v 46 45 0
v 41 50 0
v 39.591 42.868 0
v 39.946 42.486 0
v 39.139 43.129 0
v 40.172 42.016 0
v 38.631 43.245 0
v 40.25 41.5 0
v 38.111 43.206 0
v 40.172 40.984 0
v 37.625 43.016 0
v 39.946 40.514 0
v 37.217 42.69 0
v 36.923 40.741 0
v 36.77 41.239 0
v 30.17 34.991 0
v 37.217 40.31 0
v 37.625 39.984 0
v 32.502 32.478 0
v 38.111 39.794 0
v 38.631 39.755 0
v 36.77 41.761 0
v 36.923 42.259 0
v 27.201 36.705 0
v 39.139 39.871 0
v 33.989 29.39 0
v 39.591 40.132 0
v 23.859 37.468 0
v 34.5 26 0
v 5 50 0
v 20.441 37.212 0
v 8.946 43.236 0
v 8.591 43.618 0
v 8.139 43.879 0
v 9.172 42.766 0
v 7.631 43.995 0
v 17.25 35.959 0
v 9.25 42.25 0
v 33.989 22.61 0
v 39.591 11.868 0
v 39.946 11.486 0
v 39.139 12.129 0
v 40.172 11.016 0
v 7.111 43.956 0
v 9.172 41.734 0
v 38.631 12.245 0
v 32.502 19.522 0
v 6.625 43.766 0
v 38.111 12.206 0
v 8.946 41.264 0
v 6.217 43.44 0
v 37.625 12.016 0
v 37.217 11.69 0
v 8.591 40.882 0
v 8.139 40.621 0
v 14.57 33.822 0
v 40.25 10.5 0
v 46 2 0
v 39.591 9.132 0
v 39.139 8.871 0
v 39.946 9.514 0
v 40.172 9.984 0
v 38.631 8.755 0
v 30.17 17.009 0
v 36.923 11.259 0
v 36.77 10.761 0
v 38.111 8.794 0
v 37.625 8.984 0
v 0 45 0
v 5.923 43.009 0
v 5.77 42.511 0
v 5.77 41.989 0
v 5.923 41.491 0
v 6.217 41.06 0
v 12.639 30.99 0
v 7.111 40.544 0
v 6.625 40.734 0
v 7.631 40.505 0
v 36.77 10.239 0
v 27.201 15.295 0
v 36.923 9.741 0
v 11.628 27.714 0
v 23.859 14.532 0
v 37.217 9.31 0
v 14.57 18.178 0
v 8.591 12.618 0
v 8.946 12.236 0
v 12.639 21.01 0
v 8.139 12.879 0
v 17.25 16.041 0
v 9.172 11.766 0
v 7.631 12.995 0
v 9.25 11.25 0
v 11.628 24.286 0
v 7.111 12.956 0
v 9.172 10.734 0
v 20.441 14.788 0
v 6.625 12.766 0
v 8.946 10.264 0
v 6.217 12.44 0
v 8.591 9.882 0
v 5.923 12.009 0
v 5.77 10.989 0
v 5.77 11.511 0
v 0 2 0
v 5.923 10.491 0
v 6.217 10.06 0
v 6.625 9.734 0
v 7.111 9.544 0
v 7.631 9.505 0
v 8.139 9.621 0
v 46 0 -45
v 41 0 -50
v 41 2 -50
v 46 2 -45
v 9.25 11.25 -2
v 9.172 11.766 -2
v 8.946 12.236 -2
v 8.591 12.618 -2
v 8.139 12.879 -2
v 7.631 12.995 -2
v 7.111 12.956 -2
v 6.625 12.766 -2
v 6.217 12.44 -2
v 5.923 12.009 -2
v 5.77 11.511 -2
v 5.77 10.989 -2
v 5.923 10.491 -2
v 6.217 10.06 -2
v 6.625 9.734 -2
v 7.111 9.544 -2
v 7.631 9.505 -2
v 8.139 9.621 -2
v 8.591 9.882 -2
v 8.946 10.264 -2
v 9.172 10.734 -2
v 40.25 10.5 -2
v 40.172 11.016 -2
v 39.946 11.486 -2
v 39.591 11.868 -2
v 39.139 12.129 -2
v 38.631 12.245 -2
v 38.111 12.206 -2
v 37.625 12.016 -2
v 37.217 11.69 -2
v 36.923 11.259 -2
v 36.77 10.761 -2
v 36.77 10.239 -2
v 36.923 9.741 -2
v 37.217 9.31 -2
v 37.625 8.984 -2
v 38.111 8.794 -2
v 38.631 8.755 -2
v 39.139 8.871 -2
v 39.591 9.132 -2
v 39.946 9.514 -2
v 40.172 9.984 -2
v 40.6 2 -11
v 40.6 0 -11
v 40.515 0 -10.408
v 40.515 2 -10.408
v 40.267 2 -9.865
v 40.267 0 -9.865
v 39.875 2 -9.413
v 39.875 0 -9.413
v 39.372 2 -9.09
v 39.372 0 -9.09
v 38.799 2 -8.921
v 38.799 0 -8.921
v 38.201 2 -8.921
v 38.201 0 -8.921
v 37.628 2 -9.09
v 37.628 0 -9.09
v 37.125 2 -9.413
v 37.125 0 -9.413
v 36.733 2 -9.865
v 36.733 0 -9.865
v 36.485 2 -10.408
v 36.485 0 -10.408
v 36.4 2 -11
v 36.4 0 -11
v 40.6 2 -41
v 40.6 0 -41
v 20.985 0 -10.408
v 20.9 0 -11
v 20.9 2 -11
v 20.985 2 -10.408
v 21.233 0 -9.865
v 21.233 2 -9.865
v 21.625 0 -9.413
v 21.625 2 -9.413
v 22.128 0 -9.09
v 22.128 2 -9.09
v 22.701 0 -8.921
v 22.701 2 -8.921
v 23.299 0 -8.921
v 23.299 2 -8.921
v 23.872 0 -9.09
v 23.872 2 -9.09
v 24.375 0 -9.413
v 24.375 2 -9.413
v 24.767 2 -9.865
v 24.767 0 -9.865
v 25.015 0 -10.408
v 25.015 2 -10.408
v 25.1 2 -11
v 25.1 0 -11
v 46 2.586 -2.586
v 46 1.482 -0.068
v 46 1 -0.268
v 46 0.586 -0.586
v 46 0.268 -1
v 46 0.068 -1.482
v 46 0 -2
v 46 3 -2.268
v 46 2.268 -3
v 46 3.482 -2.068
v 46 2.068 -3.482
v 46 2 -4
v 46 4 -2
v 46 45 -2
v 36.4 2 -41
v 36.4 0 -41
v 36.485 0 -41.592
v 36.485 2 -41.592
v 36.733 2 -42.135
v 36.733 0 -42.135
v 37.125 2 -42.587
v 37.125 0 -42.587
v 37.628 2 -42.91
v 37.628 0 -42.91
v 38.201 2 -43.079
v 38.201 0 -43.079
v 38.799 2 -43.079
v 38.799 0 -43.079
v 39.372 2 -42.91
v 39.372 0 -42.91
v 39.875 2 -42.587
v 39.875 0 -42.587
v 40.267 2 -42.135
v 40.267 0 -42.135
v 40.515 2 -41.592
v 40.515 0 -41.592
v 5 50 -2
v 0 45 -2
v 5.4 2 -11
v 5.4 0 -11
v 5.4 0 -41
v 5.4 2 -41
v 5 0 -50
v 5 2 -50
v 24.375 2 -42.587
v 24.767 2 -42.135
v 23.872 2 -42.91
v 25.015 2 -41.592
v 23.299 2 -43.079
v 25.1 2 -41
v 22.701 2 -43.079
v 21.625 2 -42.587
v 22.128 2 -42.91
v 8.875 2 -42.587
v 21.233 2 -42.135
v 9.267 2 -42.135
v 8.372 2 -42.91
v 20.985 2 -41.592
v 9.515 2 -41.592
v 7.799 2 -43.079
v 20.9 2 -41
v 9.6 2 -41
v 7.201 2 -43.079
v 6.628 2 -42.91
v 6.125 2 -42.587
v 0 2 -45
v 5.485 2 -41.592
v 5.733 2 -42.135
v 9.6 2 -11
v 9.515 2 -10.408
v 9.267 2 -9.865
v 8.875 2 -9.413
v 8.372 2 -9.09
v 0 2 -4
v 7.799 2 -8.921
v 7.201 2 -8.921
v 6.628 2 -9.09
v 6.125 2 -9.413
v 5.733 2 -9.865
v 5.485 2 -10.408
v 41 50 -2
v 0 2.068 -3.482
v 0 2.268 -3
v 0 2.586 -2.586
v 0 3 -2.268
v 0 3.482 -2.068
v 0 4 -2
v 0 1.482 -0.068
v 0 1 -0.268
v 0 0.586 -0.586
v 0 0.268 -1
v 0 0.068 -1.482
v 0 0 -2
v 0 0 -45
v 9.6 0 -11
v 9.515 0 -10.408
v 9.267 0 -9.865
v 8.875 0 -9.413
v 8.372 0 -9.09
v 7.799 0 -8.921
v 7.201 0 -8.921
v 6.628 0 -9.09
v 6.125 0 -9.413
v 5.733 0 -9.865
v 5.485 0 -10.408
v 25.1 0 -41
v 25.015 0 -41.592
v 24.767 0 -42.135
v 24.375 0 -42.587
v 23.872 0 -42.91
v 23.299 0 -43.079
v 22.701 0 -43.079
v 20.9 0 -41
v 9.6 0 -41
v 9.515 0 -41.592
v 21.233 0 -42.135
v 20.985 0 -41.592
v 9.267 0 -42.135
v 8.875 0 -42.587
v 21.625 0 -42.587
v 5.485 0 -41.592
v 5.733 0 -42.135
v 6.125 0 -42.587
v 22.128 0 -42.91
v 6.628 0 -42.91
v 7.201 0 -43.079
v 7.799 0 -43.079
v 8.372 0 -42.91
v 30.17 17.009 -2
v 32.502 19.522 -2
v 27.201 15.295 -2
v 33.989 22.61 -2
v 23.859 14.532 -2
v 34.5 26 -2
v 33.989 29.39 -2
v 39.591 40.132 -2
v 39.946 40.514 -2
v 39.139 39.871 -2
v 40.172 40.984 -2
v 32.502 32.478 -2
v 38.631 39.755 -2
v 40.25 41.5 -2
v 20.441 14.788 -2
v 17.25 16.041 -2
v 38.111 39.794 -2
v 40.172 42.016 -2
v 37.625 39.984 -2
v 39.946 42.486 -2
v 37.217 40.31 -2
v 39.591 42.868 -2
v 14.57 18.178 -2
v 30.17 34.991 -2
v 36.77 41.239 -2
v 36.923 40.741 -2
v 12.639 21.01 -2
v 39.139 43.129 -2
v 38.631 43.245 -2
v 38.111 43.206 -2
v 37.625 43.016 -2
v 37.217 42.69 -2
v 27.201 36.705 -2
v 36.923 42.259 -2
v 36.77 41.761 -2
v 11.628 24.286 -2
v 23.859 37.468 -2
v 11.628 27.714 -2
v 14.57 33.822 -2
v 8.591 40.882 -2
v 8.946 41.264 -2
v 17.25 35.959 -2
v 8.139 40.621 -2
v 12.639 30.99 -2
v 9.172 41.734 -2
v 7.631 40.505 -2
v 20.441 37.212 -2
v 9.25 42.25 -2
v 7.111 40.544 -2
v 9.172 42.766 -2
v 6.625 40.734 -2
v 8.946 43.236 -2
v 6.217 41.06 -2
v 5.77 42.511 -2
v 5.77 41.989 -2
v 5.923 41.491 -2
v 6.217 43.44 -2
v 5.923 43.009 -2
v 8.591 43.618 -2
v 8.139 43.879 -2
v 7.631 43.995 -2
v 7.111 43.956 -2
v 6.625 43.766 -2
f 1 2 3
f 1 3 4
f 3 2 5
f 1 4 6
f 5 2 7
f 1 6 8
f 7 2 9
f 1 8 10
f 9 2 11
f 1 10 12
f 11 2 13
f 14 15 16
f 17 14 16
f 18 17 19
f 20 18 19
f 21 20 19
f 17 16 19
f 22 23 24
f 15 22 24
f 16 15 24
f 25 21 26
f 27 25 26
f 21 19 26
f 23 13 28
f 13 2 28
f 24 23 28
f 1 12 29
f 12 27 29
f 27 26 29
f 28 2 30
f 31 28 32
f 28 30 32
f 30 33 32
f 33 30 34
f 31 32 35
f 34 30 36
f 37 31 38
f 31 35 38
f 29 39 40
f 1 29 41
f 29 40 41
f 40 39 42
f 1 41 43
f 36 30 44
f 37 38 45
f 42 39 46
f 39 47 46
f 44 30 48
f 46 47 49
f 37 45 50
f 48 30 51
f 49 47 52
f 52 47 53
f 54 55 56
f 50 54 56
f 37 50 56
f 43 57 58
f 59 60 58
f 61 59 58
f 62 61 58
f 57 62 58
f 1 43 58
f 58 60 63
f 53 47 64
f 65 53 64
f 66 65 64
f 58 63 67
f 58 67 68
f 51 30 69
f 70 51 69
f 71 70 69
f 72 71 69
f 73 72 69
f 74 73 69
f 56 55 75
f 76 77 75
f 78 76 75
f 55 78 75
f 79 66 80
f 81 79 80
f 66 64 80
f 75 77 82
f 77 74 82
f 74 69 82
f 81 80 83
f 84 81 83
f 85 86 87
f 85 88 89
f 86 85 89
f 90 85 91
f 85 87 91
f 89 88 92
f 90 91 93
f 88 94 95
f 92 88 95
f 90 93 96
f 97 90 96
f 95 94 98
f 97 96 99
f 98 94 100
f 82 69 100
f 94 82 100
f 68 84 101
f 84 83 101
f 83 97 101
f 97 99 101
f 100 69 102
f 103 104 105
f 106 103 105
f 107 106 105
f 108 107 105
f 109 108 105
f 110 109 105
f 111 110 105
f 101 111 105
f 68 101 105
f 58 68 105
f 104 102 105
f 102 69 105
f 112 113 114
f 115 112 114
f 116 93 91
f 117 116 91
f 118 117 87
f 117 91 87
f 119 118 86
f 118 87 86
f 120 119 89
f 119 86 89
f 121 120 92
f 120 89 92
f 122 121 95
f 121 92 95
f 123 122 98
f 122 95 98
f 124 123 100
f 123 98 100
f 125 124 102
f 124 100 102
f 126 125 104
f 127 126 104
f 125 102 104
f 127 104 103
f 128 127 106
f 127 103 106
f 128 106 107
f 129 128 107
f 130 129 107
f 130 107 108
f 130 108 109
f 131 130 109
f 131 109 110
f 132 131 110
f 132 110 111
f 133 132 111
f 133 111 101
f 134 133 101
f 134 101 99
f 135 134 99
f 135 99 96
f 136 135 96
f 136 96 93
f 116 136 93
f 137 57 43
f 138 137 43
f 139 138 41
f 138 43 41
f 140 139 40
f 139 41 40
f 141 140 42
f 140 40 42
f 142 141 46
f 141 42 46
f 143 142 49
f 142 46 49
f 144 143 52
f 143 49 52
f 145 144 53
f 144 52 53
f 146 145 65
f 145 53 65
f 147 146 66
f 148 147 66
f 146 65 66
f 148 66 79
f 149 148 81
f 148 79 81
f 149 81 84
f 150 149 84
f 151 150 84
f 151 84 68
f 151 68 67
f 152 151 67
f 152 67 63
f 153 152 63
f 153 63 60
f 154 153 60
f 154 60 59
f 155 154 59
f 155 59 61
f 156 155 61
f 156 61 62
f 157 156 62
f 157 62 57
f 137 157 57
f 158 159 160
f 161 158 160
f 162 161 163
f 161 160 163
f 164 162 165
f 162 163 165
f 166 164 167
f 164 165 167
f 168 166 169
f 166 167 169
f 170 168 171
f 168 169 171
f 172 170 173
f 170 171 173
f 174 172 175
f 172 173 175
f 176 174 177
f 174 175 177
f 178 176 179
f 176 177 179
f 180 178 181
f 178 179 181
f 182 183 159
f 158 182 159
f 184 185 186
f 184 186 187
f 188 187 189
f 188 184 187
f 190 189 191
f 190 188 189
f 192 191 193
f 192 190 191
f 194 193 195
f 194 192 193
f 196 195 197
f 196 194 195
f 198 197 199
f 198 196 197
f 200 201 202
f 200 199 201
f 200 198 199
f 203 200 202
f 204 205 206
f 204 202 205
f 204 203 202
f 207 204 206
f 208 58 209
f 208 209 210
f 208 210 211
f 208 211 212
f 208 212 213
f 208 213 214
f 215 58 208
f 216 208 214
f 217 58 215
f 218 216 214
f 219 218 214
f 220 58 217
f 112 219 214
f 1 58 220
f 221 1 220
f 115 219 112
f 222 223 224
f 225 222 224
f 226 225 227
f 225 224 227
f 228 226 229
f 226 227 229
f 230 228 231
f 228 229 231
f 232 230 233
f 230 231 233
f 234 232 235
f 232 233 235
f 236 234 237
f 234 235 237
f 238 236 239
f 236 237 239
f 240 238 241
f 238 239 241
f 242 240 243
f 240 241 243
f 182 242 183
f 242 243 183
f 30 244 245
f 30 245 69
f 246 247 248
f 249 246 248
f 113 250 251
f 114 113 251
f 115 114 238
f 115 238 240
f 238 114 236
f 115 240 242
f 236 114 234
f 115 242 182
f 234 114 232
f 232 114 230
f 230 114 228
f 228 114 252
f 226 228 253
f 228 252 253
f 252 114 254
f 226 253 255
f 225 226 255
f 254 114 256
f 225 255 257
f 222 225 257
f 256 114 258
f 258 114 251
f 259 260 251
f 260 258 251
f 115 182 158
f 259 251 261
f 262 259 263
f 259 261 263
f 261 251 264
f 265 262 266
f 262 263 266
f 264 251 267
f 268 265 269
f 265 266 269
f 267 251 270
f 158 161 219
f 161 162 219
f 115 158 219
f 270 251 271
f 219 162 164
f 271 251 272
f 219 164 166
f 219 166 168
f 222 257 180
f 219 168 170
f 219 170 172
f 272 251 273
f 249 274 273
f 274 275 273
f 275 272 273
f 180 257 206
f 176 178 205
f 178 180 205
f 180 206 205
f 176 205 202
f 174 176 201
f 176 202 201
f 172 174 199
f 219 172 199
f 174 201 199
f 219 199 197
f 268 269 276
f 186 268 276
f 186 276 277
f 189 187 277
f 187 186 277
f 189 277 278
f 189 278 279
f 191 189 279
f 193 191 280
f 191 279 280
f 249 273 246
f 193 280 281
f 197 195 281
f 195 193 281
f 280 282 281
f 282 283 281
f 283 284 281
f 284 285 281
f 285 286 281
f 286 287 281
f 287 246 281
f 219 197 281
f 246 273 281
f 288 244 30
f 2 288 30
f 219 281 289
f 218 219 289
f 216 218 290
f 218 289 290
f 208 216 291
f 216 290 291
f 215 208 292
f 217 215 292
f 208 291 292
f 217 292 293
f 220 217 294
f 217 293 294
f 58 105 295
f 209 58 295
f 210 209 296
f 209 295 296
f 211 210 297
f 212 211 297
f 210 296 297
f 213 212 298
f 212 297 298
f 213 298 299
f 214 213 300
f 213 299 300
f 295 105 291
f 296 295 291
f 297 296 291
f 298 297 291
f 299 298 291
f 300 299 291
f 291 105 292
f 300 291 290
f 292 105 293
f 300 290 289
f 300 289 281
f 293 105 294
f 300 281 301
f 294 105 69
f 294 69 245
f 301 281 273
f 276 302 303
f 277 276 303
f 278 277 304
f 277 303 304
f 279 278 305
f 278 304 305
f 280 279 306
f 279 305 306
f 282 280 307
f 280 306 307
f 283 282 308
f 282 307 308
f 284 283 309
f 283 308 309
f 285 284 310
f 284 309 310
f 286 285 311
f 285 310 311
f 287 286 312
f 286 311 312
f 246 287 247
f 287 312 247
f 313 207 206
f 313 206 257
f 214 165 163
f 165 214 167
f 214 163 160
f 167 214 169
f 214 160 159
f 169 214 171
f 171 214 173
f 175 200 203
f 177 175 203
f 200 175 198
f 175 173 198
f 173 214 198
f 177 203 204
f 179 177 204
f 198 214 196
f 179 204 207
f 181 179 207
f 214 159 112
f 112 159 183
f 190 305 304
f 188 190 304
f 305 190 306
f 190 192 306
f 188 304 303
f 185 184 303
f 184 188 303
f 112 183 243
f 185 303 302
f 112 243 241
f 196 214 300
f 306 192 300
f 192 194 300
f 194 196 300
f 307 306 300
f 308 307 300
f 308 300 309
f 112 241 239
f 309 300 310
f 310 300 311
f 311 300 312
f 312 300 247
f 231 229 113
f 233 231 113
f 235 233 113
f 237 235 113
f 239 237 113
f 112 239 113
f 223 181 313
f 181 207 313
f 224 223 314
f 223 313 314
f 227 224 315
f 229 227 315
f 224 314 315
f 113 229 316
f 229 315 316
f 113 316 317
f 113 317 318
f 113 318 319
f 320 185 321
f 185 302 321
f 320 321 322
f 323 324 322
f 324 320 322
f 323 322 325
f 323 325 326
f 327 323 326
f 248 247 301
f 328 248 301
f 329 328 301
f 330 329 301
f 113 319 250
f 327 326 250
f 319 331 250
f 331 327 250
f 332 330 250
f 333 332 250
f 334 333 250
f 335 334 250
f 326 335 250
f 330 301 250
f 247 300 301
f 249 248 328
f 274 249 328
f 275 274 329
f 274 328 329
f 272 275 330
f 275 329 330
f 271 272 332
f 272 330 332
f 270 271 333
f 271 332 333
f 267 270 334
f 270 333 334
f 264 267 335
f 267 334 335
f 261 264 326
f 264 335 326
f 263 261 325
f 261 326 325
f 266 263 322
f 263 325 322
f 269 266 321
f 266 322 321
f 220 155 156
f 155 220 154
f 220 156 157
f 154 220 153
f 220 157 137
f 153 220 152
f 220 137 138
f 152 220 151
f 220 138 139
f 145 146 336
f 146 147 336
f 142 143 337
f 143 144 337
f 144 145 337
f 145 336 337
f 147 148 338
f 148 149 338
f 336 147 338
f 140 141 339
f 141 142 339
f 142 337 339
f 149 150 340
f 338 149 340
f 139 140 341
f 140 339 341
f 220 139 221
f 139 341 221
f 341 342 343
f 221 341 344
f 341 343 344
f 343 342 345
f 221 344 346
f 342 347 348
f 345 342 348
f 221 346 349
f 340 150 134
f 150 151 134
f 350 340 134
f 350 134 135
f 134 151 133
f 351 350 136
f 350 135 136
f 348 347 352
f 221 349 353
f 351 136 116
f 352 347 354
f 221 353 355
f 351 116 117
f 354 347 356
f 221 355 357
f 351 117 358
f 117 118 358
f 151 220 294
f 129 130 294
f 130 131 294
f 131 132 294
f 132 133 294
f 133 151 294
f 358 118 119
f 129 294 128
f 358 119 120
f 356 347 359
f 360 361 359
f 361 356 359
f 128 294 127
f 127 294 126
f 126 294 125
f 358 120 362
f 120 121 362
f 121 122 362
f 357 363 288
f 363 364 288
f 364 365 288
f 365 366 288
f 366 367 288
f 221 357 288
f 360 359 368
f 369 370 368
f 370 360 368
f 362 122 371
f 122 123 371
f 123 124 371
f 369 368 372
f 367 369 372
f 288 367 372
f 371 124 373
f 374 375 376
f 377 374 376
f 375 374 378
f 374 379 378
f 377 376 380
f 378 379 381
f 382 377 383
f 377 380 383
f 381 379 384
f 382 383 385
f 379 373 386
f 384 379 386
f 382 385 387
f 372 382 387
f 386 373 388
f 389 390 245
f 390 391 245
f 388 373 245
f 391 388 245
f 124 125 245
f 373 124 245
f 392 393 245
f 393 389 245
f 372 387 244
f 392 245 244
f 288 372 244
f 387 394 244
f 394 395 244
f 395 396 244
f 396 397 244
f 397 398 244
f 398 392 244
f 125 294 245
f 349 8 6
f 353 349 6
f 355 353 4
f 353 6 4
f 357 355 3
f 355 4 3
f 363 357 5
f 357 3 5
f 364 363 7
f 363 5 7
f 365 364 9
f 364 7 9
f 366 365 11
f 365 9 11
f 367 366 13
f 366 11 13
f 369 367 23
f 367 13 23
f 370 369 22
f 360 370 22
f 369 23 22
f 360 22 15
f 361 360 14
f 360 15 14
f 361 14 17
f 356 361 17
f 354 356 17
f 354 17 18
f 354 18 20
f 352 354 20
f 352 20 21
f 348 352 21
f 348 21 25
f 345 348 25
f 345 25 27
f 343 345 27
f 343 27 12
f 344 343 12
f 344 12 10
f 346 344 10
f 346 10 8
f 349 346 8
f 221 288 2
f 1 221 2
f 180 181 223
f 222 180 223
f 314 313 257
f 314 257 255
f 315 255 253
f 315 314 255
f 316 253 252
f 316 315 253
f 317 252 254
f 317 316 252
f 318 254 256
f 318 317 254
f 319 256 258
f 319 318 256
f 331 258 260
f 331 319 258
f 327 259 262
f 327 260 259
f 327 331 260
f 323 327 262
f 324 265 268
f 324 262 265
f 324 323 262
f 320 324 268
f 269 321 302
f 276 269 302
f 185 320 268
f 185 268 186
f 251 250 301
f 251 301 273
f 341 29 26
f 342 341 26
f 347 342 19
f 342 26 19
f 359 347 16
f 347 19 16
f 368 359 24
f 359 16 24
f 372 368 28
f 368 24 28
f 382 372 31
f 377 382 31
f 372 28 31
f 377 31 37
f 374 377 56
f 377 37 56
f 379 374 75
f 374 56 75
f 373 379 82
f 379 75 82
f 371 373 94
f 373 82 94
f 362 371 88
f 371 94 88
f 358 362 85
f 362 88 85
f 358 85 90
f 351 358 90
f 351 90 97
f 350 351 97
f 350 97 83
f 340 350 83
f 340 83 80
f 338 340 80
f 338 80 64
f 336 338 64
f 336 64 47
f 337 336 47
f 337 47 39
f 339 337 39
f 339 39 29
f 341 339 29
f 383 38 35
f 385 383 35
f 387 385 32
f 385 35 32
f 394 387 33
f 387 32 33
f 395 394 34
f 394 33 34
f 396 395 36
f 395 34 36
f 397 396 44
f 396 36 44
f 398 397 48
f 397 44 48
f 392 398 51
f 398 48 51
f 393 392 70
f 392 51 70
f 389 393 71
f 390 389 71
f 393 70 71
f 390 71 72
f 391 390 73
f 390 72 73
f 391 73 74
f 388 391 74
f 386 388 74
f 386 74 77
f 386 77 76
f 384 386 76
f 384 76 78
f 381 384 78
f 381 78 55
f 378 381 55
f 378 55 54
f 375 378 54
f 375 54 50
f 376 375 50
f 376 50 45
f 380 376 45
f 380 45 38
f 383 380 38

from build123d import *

# Parameters (mm, degrees)
SALIENTE_EXTRUIR1_DEPTH = 46
CROQUIS2_R              = 11.5
CROQUIS2_R_2            = 1.75
CORTAR_EXTRUIR1_DEPTH   = 85.356386836
CORTAR_EXTRUIR2_DEPTH   = 85.356386836
CHAFL_N1_SIZE           = 5
CORTE_EXTRUS_O1_DEPTH   = 85.356386836


with BuildPart() as part:
    # Croquis1 → Saliente-Extruir1 (new body)
    with BuildSketch(Plane(origin=(0, 0, 0), x_dir=(0, 0, -1), z_dir=(1, 0, 0))):
        with BuildLine():
            Line((2, 0), (50, 0))
            Line((50, 0), (50, 2))
            Line((50, 2), (4, 2))
            ThreePointArc((4, 2), (2.585786438, 2.585786438), (2, 4))
            Line((2, 4), (2, 50))
            Line((2, 50), (0, 50))
            Line((0, 50), (0, 2))
            ThreePointArc((0, 2), (0.585786438, 0.585786438), (2, 0))
        make_face()
    extrude(amount=SALIENTE_EXTRUIR1_DEPTH)

    # Croquis2 → Cortar-Extruir1 (cut, through all)
    with BuildSketch(Plane.XY):
        with Locations((23, 26)):
            Circle(CROQUIS2_R)
        with Locations((7.5, 42.25)):
            Circle(CROQUIS2_R_2)
        with Locations((38.5, 41.5)):
            Circle(CROQUIS2_R_2)
        with Locations((7.5, 11.25)):
            Circle(CROQUIS2_R_2)
        with Locations((38.5, 10.5)):
            Circle(CROQUIS2_R_2)
    extrude(amount=-CORTAR_EXTRUIR1_DEPTH, mode=Mode.SUBTRACT)

    # Croquis3 → Cortar-Extruir2 (cut, through all)
    with BuildSketch(Plane.XZ):
        with BuildLine():
            Line((5.4, -11), (5.4, -41))
            ThreePointArc((5.4, -41), (7.5, -43.1), (9.6, -41))
            Line((9.6, -41), (9.6, -11))
            ThreePointArc((9.6, -11), (7.5, -8.9), (5.4, -11))
        make_face()
        with BuildLine():
            Line((36.4, -11), (36.4, -41))
            ThreePointArc((36.4, -41), (38.5, -43.1), (40.6, -41))
            Line((40.6, -41), (40.6, -11))
            ThreePointArc((40.6, -11), (38.5, -8.9), (36.4, -11))
        make_face()
    extrude(amount=-CORTAR_EXTRUIR2_DEPTH, mode=Mode.SUBTRACT)

    # Chaflán1
    chafl_n1_edges = [part.edges().sort_by_distance(p)[0] for p in [
        (0, 1, -50),
        (46, 50, -1),
        (46, 1, -50),
        (0, 50, -1),
    ]]
    chamfer(chafl_n1_edges, length=CHAFL_N1_SIZE)

    # Esboço1 → Corte-extrusão1 (cut, through all)
    with BuildSketch(Plane.XZ):
        with BuildLine():
            Line((20.9, -41), (20.9, -11))
            ThreePointArc((20.9, -11), (23, -8.9), (25.1, -11))
            Line((25.1, -11), (25.1, -41))
            ThreePointArc((25.1, -41), (23, -43.1), (20.9, -41))
        make_face()
    extrude(amount=-CORTE_EXTRUS_O1_DEPTH, mode=Mode.SUBTRACT)


solid = part.part
